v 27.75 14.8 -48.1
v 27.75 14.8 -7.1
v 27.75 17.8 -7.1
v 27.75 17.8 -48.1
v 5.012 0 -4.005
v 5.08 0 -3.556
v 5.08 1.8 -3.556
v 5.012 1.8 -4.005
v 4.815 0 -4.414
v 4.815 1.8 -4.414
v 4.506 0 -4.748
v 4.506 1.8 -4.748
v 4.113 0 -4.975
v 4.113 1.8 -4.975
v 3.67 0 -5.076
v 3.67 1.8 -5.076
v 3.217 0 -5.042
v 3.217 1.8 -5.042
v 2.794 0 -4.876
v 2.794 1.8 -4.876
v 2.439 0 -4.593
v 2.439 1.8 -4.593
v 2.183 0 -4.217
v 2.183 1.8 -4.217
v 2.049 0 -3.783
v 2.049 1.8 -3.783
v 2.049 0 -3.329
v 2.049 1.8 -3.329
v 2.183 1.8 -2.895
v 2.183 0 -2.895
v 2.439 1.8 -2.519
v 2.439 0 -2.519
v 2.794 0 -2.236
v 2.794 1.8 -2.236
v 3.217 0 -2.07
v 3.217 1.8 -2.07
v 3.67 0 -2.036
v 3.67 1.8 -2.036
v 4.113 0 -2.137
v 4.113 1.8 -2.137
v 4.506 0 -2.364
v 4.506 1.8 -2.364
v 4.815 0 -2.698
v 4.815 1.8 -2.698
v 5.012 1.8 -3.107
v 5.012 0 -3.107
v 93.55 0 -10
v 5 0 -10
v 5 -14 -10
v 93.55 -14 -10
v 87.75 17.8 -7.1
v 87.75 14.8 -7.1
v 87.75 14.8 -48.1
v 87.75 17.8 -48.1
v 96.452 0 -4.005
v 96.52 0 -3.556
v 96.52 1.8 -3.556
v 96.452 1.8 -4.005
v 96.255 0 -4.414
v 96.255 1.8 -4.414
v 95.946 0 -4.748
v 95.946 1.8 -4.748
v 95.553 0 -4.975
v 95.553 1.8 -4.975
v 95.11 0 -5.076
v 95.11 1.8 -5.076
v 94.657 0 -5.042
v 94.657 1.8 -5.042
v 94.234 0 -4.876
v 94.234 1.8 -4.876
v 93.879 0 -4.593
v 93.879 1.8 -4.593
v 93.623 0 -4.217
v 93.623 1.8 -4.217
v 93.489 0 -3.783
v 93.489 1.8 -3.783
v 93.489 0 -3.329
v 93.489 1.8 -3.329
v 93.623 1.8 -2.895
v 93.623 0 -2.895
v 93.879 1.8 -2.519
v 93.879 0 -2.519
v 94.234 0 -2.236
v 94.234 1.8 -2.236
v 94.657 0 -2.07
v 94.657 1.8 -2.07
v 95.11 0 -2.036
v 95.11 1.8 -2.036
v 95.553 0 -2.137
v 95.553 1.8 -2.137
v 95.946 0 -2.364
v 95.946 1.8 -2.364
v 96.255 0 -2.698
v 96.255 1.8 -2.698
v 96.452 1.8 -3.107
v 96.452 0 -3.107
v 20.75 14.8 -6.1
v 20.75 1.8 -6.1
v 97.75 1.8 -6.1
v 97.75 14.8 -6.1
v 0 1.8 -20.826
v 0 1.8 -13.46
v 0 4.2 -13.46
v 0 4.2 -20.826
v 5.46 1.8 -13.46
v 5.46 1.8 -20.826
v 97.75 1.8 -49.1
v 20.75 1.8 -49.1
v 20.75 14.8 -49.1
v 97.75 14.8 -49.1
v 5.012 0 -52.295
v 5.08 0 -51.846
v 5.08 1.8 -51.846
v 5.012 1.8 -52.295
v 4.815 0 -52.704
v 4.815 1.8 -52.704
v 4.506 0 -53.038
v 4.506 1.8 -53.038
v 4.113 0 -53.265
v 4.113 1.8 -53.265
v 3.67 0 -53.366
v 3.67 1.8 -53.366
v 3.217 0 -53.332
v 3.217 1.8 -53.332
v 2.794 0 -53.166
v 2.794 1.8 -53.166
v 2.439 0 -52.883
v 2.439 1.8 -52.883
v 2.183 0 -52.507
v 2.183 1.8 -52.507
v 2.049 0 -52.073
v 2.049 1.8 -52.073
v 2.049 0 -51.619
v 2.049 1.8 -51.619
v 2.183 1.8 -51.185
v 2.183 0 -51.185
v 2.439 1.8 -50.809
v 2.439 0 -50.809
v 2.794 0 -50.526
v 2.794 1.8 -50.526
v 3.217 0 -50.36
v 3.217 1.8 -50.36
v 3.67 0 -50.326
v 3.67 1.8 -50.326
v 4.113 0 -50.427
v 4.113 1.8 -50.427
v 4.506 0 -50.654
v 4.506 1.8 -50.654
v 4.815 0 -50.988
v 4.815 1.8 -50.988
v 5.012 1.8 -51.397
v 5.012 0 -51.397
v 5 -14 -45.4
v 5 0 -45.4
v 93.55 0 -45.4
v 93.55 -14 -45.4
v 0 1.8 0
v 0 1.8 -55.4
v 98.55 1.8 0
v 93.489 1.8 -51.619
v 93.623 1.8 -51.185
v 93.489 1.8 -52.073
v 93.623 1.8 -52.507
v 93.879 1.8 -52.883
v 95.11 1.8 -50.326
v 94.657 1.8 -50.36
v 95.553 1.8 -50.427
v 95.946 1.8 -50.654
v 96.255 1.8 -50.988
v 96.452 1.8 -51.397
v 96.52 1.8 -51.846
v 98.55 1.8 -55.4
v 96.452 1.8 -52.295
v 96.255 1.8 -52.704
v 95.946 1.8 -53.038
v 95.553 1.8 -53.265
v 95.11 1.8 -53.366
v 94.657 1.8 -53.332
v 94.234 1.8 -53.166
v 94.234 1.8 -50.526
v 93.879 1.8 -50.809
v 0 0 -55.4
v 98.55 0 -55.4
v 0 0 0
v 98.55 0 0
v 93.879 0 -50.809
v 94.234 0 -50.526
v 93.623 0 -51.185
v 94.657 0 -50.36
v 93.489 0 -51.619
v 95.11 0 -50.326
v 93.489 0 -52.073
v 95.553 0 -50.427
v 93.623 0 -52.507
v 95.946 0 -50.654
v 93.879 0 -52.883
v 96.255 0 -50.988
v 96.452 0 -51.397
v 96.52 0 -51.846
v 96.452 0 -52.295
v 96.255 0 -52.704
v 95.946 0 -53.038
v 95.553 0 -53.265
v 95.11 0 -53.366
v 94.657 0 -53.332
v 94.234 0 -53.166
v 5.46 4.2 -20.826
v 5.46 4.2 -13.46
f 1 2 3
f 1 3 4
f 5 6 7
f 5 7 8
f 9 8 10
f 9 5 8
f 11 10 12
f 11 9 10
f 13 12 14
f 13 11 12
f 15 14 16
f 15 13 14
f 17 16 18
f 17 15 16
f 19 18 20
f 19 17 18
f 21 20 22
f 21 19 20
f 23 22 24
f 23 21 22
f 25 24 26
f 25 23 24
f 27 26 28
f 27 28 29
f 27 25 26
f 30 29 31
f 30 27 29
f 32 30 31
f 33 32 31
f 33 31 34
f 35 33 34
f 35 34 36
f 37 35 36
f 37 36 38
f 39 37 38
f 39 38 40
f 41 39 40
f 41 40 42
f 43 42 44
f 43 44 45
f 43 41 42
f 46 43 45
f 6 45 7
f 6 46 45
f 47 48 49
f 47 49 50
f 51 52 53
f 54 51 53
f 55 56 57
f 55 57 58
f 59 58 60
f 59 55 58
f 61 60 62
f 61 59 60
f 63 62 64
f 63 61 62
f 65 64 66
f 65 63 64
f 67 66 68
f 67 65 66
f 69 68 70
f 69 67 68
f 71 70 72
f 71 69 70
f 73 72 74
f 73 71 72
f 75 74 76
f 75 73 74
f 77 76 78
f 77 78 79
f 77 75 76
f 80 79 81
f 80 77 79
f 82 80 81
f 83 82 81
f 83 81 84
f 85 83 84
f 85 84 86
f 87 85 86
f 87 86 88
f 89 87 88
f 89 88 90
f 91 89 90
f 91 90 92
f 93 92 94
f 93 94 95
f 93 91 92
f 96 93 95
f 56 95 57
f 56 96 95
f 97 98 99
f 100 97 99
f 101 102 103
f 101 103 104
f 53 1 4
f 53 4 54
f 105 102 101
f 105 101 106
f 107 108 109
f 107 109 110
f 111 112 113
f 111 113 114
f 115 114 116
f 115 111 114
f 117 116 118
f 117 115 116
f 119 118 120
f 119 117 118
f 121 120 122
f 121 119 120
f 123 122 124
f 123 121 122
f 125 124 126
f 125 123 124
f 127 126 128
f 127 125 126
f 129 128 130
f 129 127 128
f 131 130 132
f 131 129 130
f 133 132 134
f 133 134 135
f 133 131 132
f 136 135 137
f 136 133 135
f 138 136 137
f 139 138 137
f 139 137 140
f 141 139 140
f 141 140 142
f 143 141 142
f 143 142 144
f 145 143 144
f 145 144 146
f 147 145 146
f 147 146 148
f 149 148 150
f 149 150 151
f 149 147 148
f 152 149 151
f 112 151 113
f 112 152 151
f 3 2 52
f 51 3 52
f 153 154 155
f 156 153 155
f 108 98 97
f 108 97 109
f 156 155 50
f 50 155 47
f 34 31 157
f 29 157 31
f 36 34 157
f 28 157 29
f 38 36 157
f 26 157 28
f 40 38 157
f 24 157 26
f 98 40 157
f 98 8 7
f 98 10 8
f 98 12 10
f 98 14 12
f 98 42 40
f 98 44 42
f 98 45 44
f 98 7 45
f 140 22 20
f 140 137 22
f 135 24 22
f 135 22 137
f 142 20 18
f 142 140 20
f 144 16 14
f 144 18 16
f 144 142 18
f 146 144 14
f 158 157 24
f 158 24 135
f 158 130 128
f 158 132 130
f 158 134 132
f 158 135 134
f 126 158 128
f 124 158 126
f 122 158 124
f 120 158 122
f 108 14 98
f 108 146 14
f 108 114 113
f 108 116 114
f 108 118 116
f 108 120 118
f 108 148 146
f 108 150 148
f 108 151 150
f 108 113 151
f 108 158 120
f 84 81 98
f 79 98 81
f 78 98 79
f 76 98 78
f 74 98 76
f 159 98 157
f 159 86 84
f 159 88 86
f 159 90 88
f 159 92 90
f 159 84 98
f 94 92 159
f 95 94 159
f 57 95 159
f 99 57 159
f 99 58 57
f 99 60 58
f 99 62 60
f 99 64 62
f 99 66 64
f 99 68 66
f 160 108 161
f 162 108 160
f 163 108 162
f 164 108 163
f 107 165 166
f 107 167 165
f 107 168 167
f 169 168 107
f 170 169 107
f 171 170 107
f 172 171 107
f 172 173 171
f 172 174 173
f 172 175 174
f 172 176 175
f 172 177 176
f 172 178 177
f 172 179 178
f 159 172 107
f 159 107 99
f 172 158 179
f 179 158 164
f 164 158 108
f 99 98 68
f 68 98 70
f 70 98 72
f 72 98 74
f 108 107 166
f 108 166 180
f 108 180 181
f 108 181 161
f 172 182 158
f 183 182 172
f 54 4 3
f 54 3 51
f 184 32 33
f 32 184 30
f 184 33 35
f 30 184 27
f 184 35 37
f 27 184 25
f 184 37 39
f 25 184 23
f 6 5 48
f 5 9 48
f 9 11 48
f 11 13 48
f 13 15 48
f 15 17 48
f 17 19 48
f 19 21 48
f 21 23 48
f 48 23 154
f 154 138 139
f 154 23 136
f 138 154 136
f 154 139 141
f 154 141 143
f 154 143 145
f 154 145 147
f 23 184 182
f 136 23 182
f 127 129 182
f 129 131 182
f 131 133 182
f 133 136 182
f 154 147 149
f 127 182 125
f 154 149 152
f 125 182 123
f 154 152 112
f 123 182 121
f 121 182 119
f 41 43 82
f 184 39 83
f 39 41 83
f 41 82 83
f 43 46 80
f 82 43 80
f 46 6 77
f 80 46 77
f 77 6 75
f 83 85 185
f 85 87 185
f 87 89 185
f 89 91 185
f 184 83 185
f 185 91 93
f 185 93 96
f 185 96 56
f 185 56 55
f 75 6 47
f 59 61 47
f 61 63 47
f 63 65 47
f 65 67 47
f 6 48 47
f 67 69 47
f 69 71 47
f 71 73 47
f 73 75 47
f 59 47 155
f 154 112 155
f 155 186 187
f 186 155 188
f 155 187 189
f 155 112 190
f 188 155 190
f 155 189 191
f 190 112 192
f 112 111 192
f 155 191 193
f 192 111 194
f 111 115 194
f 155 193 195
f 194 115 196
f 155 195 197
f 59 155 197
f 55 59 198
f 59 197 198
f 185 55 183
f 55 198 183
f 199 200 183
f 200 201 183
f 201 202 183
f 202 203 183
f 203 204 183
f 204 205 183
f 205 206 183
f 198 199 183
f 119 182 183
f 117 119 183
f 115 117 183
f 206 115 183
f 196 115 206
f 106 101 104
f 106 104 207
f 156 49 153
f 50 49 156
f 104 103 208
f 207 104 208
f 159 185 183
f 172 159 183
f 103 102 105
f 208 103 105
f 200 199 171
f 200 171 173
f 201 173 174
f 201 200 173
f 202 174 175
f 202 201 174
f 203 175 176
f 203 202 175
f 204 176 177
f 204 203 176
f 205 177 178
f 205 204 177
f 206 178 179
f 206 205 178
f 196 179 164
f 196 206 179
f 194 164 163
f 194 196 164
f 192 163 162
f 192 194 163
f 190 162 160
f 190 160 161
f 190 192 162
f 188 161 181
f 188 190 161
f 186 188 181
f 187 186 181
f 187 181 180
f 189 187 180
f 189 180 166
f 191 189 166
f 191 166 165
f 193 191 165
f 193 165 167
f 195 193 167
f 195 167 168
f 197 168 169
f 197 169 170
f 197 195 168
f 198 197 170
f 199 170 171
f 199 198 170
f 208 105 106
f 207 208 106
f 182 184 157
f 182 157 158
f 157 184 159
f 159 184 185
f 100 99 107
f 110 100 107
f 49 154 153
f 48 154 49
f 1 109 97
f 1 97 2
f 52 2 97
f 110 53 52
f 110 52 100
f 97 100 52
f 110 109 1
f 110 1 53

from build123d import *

# Parameters (mm, degrees)
SKETCH_1_W      = 98.55
SKETCH_1_H      = 55.4
SKETCH_1_R      = 1.524
EXTRUDE_1_DEPTH = 1.8
SKETCH_2_W      = 77
SKETCH_2_H      = 43
EXTRUDE_2_DEPTH = 13
SKETCH_3_W      = 60
SKETCH_3_H      = 41
EXTRUDE_3_DEPTH = 3
SKETCH_4_W      = 5.46
SKETCH_4_H      = 7.366
EXTRUDE_4_DEPTH = 2.4
SKETCH_5_W      = 88.55
SKETCH_5_H      = 35.4
EXTRUDE_5_DEPTH = 14


with BuildPart() as part:
    # 草图1 → 凸台-拉伸1 (new body)
    with BuildSketch(Plane(origin=(0, 0, 0), x_dir=(1, 0, 0), z_dir=(0, 1, 0))):
        with Locations((49.275, 27.7)):
            Rectangle(SKETCH_1_W, SKETCH_1_H)
        with Locations((3.556, 3.556)):
            Circle(SKETCH_1_R, mode=Mode.SUBTRACT)
        with Locations((94.996, 3.556)):
            Circle(SKETCH_1_R, mode=Mode.SUBTRACT)
        with Locations((94.996, 51.846)):
            Circle(SKETCH_1_R, mode=Mode.SUBTRACT)
        with Locations((3.556, 51.846)):
            Circle(SKETCH_1_R, mode=Mode.SUBTRACT)
    extrude(amount=EXTRUDE_1_DEPTH)

    # 草图2 → 凸台-拉伸2 (add)
    with BuildSketch(Plane(origin=(0, 1.8, 0), x_dir=(1, 0, 0), z_dir=(0, 1, 0))):
        with Locations((59.25, 27.6)):
            Rectangle(SKETCH_2_W, SKETCH_2_H)
    extrude(amount=EXTRUDE_2_DEPTH)

    # 草图3 → 凸台-拉伸3 (add)
    with BuildSketch(Plane(origin=(0, 14.8, 0), x_dir=(1, 0, 0), z_dir=(0, 1, 0))):
        with Locations((57.75, 27.6)):
            Rectangle(SKETCH_3_W, SKETCH_3_H)
    extrude(amount=EXTRUDE_3_DEPTH)

    # 草图5 → 凸台-拉伸5 (add)
    with BuildSketch(Plane.XZ):
        with Locations((49.275, -27.7)):
            Rectangle(SKETCH_5_W, SKETCH_5_H)
    extrude(amount=EXTRUDE_5_DEPTH)


with BuildPart() as body_2:
    # 草图4 → 凸台-拉伸4 (new body)
    with BuildSketch(Plane(origin=(0, 1.8, 0), x_dir=(1, 0, 0), z_dir=(0, 1, 0))):
        with Locations((2.73, 17.143)):
            Rectangle(SKETCH_4_W, SKETCH_4_H)
    extrude(amount=EXTRUDE_4_DEPTH)


solid = Compound([part.part, body_2.part])
